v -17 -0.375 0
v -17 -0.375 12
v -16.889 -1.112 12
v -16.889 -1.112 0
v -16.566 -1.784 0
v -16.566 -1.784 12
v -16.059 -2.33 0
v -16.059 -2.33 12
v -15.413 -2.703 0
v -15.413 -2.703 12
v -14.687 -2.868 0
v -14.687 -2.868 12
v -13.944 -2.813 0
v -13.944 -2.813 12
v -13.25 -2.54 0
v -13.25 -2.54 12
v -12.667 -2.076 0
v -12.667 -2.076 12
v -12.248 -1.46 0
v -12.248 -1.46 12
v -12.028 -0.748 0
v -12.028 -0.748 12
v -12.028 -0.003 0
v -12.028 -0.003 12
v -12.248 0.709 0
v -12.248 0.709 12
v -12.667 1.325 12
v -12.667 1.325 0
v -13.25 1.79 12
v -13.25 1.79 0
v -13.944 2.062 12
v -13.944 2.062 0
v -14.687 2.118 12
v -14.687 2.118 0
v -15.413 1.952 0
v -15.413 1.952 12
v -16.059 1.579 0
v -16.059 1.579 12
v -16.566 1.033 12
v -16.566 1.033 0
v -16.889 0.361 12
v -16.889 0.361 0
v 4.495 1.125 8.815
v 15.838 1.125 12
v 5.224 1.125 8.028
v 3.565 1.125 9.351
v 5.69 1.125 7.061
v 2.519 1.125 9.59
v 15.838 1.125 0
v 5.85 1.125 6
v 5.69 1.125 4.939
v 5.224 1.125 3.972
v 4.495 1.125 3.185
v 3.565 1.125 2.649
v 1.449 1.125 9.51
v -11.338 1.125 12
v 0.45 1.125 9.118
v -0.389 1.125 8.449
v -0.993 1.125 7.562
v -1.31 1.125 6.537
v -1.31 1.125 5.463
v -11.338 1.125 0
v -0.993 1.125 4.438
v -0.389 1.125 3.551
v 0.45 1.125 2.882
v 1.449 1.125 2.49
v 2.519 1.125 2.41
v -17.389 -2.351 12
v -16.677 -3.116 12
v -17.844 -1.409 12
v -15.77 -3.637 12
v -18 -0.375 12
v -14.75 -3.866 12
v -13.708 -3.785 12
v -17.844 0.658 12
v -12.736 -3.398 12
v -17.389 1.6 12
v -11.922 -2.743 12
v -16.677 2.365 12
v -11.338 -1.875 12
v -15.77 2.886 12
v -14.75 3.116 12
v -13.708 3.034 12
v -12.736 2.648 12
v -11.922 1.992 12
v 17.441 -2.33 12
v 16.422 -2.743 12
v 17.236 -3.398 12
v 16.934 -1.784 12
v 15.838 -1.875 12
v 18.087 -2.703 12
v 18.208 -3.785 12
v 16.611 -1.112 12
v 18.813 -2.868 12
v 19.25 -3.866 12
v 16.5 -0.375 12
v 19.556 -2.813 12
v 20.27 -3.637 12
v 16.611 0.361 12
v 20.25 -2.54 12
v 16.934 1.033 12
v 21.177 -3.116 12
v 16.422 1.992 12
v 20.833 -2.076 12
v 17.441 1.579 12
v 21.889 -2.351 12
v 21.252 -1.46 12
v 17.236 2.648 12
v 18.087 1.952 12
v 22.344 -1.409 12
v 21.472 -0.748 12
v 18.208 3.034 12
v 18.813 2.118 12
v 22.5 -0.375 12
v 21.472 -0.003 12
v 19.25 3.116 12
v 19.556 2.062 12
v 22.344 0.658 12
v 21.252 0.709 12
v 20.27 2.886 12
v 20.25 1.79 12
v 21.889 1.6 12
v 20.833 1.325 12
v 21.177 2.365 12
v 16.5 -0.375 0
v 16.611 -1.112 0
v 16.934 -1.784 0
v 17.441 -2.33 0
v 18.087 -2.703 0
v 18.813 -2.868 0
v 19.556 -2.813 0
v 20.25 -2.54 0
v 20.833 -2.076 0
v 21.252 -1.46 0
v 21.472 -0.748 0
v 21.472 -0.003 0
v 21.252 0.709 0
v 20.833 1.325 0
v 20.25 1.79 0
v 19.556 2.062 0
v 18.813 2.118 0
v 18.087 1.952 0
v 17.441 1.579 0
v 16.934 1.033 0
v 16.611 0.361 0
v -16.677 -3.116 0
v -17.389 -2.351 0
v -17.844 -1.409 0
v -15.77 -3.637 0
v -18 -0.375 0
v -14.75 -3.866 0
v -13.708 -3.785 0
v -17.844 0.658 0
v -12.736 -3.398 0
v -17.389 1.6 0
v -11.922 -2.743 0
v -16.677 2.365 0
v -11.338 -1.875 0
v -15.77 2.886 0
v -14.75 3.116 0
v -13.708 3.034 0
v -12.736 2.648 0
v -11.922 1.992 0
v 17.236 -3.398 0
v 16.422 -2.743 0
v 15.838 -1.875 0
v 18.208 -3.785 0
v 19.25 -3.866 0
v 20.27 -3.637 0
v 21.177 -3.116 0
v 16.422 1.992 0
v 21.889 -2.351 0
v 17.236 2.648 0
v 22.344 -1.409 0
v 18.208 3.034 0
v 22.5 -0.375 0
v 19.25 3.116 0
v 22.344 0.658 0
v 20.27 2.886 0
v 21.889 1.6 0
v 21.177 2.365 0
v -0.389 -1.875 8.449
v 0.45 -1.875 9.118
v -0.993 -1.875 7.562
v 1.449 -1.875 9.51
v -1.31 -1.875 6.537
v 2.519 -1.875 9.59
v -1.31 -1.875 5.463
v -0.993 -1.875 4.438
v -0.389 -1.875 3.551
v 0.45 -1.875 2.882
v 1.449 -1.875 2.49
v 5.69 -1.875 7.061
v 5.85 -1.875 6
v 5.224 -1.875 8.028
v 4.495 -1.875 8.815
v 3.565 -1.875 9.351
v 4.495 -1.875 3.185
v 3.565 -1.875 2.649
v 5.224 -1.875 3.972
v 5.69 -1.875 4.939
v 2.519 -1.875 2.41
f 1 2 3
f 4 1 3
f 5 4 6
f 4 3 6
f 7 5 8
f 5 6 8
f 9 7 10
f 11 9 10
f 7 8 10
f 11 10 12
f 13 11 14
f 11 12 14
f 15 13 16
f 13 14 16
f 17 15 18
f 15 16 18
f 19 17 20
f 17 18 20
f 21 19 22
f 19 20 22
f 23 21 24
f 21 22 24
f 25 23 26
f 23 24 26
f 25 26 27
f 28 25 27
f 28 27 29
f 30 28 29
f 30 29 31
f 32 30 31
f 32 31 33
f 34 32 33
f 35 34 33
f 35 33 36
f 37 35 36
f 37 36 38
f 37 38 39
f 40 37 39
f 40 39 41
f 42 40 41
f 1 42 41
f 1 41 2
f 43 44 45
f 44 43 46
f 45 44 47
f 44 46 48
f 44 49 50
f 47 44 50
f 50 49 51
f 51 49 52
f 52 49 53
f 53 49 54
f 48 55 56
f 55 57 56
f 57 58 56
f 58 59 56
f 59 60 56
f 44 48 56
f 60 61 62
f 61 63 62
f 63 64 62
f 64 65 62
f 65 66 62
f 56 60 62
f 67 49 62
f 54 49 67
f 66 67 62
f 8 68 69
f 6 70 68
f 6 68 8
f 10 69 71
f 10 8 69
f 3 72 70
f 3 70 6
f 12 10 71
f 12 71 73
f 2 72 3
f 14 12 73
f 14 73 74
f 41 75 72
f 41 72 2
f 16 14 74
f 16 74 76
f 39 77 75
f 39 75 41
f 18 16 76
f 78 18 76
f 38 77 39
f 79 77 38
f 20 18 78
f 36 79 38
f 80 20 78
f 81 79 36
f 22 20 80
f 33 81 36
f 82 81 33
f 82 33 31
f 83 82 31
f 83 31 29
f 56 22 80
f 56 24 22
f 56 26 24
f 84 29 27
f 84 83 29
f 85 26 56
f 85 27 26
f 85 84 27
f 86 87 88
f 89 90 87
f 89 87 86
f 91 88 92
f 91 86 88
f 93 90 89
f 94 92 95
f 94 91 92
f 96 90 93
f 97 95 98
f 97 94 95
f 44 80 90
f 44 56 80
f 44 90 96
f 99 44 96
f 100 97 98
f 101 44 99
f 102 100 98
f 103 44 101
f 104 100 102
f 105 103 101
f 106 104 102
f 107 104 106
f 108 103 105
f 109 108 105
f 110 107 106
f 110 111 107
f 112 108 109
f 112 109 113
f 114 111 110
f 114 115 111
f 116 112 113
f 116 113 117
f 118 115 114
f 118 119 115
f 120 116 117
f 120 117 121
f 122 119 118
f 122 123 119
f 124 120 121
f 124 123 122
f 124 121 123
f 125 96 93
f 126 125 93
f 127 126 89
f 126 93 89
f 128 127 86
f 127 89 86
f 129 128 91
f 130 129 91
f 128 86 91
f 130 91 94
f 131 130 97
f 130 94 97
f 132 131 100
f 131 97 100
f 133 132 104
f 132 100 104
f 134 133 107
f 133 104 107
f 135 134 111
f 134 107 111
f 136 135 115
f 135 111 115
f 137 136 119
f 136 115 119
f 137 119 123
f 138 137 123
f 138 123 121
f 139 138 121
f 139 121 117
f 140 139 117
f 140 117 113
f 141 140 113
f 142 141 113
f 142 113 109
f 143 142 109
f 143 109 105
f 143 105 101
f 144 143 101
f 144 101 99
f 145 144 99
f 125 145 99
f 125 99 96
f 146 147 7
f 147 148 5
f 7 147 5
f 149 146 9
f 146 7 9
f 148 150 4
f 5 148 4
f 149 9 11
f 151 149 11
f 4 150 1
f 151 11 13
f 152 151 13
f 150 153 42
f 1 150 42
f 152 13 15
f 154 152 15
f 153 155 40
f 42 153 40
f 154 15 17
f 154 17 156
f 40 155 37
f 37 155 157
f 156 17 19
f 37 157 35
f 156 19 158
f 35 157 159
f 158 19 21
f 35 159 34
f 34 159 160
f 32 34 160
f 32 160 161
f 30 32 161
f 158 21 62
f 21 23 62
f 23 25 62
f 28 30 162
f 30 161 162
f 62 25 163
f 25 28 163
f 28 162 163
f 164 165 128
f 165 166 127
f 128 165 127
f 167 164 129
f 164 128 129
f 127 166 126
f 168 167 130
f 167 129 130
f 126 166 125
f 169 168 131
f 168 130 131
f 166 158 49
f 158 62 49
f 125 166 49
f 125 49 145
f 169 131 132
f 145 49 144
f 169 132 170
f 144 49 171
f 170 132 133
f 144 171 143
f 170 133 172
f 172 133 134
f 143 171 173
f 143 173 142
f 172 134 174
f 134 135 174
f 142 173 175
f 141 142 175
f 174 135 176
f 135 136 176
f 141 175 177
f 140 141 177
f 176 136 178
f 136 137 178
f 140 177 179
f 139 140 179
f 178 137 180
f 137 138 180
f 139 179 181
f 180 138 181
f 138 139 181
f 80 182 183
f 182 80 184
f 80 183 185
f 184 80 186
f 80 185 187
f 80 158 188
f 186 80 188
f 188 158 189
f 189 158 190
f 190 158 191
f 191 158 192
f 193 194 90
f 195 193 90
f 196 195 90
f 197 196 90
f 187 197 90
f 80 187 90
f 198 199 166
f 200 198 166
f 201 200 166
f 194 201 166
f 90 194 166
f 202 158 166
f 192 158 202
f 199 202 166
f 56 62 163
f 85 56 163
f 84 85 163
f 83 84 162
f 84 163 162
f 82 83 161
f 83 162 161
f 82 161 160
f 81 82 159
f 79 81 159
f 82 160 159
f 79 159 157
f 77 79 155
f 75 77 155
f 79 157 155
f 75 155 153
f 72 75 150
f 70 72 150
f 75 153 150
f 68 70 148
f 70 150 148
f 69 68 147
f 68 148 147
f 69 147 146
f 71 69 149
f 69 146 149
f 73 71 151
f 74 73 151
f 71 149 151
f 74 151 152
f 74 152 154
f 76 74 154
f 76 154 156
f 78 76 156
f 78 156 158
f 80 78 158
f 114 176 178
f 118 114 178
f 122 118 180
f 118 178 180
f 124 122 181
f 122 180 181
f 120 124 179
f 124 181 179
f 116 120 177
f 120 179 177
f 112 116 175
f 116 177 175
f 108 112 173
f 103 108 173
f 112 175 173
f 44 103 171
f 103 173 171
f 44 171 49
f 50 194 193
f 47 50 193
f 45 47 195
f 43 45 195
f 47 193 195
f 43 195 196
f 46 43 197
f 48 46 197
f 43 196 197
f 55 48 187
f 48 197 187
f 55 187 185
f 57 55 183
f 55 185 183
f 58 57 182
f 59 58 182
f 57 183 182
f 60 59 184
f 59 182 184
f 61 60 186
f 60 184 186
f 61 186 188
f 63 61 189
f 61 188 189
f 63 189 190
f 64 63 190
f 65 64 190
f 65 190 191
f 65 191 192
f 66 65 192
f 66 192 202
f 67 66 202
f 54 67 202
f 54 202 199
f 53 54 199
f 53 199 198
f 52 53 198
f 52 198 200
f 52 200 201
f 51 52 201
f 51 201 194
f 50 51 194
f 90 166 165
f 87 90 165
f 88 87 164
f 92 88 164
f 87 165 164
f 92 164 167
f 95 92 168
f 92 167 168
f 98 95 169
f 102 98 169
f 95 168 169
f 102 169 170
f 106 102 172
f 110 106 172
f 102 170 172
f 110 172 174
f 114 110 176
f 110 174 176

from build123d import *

# Parameters (mm, degrees)
F1_DEPTH = 12
F2_D     = 5
F2_DEPTH = 15
F2_TIP   = 1.5021515476
F3_D     = 5
F3_DEPTH = 15
F3_TIP   = 1.5021515476
F5_D     = 7.2
F5_DEPTH = 10
F5_TIP   = 2.1630982285


# Not quite as in the source:
# - a feature names something its author has since deleted; it is built from what else it names


with BuildPart() as f1:
    # F0 (on Top) → F1 (new body)
    with BuildSketch(Plane.XY):
        with BuildLine():
            Line((-14.5, -1.8754155822), (-14.5, 1.1245844178))
            Line((-14.5, 1.1245844178), (-11.3377223398, 1.1245844178))
            ThreePointArc((-11.3377223398, 1.1245844178), (-18, -0.3754155822), (-11.3377223398, -1.8754155822))
            Line((-11.3377223398, -1.8754155822), (-14.5, -1.8754155822))
        make_face()
        with BuildLine():
            Line((-11.3377223398, 1.1245844178), (-14.5, 1.1245844178))
            Line((-14.5, 1.1245844178), (-14.5, -1.8754155822))
            Line((-14.5, -1.8754155822), (-11.3377223398, -1.8754155822))
            ThreePointArc((-11.3377223398, -1.8754155822), (-11.0854742781, -1.144189993), (-11, -0.3754155822))
            ThreePointArc((-11, -0.3754155822), (-11.0854742781, 0.3933588286), (-11.3377223398, 1.1245844178))
        make_face()
        with BuildLine():
            Line((15.8377223398, 1.1245844178), (-11.3377223398, 1.1245844178))
            ThreePointArc((-11.3377223398, 1.1245844178), (-11.0854742781, 0.3933588286), (-11, -0.3754155822))
            ThreePointArc((-11, -0.3754155822), (-11.0854742781, -1.144189993), (-11.3377223398, -1.8754155822))
            Line((-11.3377223398, -1.8754155822), (15.8377223398, -1.8754155822))
            ThreePointArc((15.8377223398, -1.8754155822), (15.5, -0.3754155822), (15.8377223398, 1.1245844178))
        make_face()
        with BuildLine():
            ThreePointArc((22.5, -0.3754155822), (19.7687744108, 3.0391101397), (15.8377223398, 1.1245844178))
            Line((15.8377223398, 1.1245844178), (19, 1.1245844178))
            Line((19, 1.1245844178), (19, -1.8754155822))
            Line((19, -1.8754155822), (15.8377223398, -1.8754155822))
            ThreePointArc((15.8377223398, -1.8754155822), (19.7687744108, -3.7899413041), (22.5, -0.3754155822))
        make_face()
        with BuildLine():
            Line((19, 1.1245844178), (15.8377223398, 1.1245844178))
            ThreePointArc((15.8377223398, 1.1245844178), (15.5, -0.3754155822), (15.8377223398, -1.8754155822))
            Line((15.8377223398, -1.8754155822), (19, -1.8754155822))
            Line((19, -1.8754155822), (19, 1.1245844178))
        make_face()
    extrude(amount=F1_DEPTH)

    # F2
    with Locations(Plane(origin=(0, 0, 0), x_dir=(1, 0, 0), z_dir=(0, 0, -1))):
        with Locations((19, 0.3754155822)):
            Hole(F2_D / 2, depth=F2_DEPTH)
            with Locations((0, 0, -(F2_DEPTH + F2_TIP / 2))):  # 118° drill point
                Cone(0, F2_D / 2, F2_TIP, mode=Mode.SUBTRACT)

    # F3
    with Locations(Plane(origin=(0, 0, 0), x_dir=(1, 0, 0), z_dir=(0, 0, -1))):
        with Locations((-14.5, 0.3754155822)):
            Hole(F3_D / 2, depth=F3_DEPTH)
            with Locations((0, 0, -(F3_DEPTH + F3_TIP / 2))):  # 118° drill point
                Cone(0, F3_D / 2, F3_TIP, mode=Mode.SUBTRACT)

    # F5
    with Locations(Plane(origin=(0, 1.1245844178, 0), x_dir=(-1, 0, 0), z_dir=(0, 1, 0))):
        with Locations((-2.25, 6)):
            Hole(F5_D / 2, depth=F5_DEPTH)
            with Locations((0, 0, -(F5_DEPTH + F5_TIP / 2))):  # 118° drill point
                Cone(0, F5_D / 2, F5_TIP, mode=Mode.SUBTRACT)


solid = f1.part
